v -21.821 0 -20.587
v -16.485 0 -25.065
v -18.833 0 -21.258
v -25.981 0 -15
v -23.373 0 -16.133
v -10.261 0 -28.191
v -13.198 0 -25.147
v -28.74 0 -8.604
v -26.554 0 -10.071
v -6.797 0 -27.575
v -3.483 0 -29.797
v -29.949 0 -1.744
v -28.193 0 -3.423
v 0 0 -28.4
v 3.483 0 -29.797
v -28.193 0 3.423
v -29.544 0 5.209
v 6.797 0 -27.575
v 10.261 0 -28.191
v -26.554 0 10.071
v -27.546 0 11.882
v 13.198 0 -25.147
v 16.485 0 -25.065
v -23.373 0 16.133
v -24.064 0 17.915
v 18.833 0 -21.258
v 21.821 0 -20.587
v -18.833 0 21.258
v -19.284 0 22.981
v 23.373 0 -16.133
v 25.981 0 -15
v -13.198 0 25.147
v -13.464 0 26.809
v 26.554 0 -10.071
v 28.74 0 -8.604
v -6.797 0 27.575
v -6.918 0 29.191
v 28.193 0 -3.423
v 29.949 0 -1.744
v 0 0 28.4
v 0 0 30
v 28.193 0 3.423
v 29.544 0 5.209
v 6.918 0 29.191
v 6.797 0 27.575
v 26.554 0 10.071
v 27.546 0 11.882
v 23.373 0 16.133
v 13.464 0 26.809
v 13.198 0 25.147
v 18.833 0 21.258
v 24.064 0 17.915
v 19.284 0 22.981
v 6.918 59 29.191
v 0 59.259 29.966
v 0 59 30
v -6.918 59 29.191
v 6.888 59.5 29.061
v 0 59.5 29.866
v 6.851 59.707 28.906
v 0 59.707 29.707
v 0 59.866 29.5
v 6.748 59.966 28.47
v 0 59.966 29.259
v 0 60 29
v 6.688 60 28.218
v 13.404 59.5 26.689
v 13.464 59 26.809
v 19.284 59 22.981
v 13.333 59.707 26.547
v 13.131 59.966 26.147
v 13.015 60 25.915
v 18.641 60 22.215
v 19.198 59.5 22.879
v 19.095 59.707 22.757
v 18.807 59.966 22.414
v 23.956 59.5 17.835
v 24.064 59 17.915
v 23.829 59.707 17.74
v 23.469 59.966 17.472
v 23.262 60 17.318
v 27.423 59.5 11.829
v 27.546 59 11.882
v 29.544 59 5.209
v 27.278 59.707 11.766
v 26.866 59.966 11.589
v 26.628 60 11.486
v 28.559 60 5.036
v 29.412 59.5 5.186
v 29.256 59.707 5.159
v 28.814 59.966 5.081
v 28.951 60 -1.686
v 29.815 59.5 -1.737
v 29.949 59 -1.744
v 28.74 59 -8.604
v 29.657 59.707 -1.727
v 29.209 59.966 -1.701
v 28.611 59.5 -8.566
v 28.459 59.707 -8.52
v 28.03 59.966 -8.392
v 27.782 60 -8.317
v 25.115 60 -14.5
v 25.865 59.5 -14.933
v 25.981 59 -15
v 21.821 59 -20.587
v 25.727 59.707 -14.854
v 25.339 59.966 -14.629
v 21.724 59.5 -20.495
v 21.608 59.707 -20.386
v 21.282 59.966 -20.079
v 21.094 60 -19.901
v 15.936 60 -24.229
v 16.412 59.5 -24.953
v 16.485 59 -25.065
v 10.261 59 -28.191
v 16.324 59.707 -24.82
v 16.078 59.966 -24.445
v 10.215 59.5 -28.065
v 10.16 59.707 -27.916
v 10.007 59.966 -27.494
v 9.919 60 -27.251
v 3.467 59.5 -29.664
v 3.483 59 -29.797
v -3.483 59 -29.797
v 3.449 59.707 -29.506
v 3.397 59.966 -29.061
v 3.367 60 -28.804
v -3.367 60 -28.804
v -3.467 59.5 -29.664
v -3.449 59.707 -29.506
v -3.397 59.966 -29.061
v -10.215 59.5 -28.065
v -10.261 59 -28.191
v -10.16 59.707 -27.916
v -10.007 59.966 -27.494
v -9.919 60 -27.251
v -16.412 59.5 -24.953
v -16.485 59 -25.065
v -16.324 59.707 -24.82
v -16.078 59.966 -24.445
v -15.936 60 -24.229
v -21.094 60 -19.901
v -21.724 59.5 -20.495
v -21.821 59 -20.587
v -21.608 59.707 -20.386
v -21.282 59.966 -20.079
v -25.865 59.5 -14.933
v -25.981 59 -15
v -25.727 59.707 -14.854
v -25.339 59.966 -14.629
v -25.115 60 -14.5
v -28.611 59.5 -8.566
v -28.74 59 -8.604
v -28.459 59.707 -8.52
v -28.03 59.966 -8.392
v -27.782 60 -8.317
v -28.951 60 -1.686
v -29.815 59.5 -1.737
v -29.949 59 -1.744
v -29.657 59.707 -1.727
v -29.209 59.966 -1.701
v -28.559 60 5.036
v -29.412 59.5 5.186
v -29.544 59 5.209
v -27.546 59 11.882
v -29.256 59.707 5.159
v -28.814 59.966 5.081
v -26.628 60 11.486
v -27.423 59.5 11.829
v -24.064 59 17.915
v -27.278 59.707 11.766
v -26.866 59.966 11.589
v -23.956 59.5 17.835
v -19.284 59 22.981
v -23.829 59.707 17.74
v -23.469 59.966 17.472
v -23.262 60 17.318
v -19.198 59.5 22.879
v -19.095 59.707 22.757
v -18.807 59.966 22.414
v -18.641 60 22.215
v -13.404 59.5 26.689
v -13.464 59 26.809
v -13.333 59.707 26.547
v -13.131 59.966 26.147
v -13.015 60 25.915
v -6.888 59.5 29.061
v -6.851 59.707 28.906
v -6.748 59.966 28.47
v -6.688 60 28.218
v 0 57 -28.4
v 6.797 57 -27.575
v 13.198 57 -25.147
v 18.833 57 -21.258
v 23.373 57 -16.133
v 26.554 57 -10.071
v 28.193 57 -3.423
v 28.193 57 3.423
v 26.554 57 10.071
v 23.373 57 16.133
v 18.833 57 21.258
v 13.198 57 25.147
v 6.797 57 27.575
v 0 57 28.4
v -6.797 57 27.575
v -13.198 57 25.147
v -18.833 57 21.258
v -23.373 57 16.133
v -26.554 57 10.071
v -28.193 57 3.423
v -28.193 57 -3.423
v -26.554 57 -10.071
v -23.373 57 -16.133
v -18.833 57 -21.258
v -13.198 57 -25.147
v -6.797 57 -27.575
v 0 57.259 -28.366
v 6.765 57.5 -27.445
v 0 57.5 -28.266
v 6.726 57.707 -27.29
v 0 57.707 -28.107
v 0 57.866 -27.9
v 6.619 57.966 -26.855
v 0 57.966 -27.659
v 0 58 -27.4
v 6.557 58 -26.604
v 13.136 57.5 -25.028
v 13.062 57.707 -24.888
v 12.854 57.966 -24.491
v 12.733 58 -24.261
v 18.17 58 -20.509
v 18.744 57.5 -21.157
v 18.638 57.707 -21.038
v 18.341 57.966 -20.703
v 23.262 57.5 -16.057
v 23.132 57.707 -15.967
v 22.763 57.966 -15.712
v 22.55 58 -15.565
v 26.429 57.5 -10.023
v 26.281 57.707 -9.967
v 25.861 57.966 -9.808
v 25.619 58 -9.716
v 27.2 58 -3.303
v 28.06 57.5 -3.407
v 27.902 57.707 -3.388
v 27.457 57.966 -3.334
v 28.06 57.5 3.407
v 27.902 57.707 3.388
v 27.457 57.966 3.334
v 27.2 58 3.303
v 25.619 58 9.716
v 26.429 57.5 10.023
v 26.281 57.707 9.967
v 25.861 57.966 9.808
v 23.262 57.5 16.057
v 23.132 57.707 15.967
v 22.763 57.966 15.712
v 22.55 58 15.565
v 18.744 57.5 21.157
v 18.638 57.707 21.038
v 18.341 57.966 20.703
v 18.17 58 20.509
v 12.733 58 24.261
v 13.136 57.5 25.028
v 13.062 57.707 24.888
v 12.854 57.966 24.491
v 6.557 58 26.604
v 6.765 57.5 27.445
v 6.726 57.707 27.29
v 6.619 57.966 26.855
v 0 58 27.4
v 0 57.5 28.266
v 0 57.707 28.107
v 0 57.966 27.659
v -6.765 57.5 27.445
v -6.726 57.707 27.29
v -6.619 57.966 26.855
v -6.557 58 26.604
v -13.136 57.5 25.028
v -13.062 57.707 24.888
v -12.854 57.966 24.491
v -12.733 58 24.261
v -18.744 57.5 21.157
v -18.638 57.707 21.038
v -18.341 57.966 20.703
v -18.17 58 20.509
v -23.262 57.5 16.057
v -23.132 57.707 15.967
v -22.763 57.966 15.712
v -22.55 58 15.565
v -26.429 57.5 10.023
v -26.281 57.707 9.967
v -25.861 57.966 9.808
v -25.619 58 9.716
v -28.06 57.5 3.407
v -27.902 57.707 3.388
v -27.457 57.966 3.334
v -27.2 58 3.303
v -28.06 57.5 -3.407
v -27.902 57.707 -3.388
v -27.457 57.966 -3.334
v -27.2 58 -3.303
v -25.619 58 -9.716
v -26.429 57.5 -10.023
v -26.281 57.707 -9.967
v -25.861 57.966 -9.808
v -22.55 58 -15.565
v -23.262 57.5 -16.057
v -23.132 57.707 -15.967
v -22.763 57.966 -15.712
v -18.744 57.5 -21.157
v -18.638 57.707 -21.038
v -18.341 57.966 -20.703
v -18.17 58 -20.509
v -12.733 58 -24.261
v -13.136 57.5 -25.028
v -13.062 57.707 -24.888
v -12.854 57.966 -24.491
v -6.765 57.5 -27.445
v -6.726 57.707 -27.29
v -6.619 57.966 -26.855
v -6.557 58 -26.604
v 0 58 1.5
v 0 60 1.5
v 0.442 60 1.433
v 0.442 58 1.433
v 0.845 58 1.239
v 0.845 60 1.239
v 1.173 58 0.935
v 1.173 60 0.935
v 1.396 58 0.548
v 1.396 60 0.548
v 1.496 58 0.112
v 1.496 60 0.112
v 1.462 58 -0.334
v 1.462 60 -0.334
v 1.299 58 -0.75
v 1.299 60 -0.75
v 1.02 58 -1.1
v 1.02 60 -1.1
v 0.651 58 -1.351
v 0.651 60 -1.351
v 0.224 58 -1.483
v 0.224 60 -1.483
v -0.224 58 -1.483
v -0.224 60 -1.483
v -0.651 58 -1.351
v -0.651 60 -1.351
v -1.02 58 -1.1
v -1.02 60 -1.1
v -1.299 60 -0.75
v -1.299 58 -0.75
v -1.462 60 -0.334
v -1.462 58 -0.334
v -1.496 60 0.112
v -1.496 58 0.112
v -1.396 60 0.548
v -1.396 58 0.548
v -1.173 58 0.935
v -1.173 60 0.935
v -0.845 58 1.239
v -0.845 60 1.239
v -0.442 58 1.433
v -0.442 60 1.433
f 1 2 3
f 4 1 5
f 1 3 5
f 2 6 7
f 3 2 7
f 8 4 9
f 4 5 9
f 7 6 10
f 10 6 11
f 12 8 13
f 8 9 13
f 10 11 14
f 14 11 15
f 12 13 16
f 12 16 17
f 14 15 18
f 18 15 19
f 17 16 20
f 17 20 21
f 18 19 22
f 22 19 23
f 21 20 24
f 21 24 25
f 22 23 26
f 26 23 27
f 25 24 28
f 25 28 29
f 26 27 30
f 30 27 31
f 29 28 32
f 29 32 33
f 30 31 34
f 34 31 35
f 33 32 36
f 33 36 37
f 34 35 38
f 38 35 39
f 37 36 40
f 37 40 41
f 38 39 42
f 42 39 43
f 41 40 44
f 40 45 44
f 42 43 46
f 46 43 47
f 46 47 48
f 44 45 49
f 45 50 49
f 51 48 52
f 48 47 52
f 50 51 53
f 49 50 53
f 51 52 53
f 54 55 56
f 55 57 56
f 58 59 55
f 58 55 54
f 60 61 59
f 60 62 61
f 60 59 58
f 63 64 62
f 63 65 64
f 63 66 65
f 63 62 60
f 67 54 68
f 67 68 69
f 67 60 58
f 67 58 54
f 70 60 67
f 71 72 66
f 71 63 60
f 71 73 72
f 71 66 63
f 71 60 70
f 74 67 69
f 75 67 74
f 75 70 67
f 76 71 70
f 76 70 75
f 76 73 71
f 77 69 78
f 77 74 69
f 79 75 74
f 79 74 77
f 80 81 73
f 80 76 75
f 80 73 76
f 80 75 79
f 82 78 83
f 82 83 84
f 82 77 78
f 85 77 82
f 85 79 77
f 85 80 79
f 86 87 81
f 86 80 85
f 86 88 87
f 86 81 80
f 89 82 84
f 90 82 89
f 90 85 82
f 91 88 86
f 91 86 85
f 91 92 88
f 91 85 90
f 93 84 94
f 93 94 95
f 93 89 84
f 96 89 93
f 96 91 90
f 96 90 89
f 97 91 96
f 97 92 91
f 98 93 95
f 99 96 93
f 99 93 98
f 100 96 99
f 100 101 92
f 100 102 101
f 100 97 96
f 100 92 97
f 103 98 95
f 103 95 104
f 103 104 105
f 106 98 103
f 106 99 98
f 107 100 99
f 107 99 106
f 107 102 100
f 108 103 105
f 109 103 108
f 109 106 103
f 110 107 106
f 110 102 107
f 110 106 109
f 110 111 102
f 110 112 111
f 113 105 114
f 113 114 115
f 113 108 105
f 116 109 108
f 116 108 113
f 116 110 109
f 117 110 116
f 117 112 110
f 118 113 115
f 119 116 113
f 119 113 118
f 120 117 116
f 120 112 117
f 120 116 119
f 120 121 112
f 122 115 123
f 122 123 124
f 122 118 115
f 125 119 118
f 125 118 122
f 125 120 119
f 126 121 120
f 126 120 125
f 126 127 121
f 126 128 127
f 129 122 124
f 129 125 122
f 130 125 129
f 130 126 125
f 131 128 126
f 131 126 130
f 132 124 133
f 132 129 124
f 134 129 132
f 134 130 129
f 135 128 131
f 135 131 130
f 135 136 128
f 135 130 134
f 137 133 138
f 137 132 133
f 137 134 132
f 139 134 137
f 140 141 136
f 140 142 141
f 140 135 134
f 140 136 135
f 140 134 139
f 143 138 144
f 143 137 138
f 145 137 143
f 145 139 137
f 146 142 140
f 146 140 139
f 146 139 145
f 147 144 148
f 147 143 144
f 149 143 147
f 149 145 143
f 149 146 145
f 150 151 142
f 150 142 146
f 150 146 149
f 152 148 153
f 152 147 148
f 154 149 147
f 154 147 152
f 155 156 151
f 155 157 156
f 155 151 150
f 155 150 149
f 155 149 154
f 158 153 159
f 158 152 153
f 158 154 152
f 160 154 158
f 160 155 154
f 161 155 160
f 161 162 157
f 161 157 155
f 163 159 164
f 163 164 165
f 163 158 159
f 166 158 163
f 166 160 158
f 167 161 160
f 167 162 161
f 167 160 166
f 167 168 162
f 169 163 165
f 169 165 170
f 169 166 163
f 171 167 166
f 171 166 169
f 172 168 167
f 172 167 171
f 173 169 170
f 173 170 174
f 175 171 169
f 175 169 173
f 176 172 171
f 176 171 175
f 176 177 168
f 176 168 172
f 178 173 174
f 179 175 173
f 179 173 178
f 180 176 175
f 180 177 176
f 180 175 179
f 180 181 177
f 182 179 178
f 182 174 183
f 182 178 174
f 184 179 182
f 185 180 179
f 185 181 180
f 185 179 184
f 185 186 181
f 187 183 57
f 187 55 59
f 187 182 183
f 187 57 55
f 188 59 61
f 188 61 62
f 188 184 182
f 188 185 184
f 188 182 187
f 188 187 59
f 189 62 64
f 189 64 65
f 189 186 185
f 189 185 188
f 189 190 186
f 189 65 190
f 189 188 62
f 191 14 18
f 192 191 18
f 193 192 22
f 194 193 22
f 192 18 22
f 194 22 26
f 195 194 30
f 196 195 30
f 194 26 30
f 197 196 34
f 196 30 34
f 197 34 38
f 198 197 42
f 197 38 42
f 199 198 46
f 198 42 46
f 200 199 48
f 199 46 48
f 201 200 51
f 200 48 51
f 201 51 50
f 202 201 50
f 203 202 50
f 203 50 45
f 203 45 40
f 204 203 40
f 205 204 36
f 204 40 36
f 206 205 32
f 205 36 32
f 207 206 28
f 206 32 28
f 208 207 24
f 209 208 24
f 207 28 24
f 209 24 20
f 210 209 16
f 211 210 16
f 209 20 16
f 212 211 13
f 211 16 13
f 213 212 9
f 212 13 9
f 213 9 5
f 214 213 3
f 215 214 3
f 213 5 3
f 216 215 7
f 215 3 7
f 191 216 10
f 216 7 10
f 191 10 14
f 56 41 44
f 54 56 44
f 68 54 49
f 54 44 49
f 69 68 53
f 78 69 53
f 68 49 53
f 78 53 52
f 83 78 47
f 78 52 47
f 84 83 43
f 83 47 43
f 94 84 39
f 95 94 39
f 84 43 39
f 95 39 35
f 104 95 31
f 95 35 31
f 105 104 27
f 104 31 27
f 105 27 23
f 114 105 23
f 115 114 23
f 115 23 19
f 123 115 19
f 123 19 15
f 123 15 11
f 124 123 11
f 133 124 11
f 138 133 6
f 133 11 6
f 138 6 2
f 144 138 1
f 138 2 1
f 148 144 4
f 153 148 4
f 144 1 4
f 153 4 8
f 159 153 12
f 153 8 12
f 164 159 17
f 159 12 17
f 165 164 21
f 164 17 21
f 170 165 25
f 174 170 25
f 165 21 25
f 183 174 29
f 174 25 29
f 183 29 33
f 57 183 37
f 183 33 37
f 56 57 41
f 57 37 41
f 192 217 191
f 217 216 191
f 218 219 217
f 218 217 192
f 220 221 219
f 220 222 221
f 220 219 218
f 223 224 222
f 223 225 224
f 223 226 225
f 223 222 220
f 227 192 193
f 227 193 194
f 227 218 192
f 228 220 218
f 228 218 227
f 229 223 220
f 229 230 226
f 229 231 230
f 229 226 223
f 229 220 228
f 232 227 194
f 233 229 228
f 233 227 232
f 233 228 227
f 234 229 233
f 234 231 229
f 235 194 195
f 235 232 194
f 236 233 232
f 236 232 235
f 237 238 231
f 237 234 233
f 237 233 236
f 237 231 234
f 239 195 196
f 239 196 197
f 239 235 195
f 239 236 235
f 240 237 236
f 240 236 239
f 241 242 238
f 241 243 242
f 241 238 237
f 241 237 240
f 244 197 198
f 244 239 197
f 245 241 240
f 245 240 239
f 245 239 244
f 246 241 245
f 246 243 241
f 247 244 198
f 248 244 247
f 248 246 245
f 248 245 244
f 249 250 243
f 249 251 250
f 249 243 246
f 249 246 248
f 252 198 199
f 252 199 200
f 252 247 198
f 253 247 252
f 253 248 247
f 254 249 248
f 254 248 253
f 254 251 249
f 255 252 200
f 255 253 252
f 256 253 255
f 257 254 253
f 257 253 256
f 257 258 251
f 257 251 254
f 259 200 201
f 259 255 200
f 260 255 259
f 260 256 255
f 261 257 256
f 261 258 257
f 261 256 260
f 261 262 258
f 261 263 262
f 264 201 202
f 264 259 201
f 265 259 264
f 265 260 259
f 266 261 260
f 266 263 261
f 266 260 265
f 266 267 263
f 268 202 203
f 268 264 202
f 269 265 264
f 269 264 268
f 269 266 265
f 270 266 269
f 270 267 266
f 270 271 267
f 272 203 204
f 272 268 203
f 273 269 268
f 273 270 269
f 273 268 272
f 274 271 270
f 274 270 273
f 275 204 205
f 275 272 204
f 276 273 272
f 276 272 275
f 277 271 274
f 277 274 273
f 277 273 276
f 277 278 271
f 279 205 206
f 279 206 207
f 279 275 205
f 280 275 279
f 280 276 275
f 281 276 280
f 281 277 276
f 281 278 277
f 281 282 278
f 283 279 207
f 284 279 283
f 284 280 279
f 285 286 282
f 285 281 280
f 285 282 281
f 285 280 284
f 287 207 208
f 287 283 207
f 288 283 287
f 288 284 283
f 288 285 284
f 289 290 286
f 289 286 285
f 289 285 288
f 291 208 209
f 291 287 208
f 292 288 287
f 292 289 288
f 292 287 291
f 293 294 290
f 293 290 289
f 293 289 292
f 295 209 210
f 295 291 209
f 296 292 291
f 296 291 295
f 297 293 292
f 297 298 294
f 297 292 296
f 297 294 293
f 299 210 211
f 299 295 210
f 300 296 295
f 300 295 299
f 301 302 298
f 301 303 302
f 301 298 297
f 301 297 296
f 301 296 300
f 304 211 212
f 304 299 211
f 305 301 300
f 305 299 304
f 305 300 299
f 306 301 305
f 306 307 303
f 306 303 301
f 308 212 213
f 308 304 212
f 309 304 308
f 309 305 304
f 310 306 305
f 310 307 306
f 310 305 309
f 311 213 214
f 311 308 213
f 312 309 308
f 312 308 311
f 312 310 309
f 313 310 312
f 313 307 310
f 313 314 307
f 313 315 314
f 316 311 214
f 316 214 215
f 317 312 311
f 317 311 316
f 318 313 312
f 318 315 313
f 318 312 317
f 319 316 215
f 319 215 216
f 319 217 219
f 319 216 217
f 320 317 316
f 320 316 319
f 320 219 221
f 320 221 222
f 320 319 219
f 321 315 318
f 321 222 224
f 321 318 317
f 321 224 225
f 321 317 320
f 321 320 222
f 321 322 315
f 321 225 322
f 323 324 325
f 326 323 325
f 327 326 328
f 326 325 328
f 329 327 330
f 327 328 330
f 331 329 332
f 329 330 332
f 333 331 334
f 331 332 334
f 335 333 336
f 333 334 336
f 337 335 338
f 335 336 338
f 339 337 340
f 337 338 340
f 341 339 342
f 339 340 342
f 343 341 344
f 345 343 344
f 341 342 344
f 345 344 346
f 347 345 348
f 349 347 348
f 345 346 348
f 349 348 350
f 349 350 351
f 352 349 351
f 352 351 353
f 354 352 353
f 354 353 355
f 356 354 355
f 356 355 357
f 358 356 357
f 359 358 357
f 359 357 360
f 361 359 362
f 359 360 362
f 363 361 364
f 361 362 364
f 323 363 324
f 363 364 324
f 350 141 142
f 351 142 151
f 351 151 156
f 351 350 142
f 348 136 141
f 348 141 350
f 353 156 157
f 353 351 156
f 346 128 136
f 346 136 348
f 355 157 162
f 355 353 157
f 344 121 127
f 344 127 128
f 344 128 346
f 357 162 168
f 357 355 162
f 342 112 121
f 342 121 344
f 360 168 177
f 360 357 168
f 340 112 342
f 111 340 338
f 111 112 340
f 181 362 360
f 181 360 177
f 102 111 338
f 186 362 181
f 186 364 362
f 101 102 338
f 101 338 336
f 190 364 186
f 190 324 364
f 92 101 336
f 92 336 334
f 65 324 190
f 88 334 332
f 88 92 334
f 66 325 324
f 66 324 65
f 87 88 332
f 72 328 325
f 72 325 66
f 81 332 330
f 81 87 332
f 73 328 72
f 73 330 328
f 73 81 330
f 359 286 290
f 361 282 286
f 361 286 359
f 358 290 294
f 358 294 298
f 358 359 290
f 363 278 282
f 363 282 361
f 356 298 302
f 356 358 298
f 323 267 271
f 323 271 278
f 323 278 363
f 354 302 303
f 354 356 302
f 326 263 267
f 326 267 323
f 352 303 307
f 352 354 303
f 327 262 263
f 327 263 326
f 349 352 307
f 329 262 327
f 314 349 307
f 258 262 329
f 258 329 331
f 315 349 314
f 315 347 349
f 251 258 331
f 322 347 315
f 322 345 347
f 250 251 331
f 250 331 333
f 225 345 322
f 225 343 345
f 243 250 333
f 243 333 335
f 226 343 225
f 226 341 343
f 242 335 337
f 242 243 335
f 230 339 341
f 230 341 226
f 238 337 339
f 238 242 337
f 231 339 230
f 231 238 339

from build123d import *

# Parameters (mm, degrees)
SKETCH1_R           = 30
BOSS_EXTRUDE1_DEPTH = 60
SKETCH2_R           = 28.4
CUT_EXTRUDE1_DEPTH  = 58
SKETCH3_R           = 1.5
CUT_EXTRUDE2_DEPTH  = 2
FILLET2_R           = 1
FILLET3_R           = 1


with BuildPart() as part:
    # Sketch1 → Boss-Extrude1 (new body)
    with BuildSketch(Plane(origin=(0, 0, 0), x_dir=(1, 0, 0), z_dir=(0, 1, 0))):
        with Locations(Location((0, 0, 0), (0, 0, 270))):
            Circle(SKETCH1_R)
    extrude(amount=BOSS_EXTRUDE1_DEPTH)

    # Sketch2 → Cut-Extrude1 (cut)
    with BuildSketch(Plane(origin=(0, 0, 0), x_dir=(-1, 0, 0), z_dir=(0, -1, 0))):
        with Locations(Location((0, 0, 0), (0, 0, 90))):
            Circle(SKETCH2_R)
    extrude(amount=-CUT_EXTRUDE1_DEPTH, mode=Mode.SUBTRACT)

    # Sketch3 → Cut-Extrude2 (cut)
    with BuildSketch(Plane(origin=(0, 60, 0), x_dir=(1, 0, 0), z_dir=(0, 1, 0))):
        with Locations(Location((0, 0, 0), (0, 0, 270))):
            Circle(SKETCH3_R)
    extrude(amount=-CUT_EXTRUDE2_DEPTH, mode=Mode.SUBTRACT)

    # Fillet2
    fillet2_edges = [part.edges().sort_by_distance(p)[0] for p in [
        (0, 58, 28.4),
    ]]
    fillet(fillet2_edges, radius=FILLET2_R)

    # Fillet3
    fillet3_edges = [part.edges().sort_by_distance(p)[0] for p in [
        (0, 60, -30),
    ]]
    fillet(fillet3_edges, radius=FILLET3_R)


solid = part.part
